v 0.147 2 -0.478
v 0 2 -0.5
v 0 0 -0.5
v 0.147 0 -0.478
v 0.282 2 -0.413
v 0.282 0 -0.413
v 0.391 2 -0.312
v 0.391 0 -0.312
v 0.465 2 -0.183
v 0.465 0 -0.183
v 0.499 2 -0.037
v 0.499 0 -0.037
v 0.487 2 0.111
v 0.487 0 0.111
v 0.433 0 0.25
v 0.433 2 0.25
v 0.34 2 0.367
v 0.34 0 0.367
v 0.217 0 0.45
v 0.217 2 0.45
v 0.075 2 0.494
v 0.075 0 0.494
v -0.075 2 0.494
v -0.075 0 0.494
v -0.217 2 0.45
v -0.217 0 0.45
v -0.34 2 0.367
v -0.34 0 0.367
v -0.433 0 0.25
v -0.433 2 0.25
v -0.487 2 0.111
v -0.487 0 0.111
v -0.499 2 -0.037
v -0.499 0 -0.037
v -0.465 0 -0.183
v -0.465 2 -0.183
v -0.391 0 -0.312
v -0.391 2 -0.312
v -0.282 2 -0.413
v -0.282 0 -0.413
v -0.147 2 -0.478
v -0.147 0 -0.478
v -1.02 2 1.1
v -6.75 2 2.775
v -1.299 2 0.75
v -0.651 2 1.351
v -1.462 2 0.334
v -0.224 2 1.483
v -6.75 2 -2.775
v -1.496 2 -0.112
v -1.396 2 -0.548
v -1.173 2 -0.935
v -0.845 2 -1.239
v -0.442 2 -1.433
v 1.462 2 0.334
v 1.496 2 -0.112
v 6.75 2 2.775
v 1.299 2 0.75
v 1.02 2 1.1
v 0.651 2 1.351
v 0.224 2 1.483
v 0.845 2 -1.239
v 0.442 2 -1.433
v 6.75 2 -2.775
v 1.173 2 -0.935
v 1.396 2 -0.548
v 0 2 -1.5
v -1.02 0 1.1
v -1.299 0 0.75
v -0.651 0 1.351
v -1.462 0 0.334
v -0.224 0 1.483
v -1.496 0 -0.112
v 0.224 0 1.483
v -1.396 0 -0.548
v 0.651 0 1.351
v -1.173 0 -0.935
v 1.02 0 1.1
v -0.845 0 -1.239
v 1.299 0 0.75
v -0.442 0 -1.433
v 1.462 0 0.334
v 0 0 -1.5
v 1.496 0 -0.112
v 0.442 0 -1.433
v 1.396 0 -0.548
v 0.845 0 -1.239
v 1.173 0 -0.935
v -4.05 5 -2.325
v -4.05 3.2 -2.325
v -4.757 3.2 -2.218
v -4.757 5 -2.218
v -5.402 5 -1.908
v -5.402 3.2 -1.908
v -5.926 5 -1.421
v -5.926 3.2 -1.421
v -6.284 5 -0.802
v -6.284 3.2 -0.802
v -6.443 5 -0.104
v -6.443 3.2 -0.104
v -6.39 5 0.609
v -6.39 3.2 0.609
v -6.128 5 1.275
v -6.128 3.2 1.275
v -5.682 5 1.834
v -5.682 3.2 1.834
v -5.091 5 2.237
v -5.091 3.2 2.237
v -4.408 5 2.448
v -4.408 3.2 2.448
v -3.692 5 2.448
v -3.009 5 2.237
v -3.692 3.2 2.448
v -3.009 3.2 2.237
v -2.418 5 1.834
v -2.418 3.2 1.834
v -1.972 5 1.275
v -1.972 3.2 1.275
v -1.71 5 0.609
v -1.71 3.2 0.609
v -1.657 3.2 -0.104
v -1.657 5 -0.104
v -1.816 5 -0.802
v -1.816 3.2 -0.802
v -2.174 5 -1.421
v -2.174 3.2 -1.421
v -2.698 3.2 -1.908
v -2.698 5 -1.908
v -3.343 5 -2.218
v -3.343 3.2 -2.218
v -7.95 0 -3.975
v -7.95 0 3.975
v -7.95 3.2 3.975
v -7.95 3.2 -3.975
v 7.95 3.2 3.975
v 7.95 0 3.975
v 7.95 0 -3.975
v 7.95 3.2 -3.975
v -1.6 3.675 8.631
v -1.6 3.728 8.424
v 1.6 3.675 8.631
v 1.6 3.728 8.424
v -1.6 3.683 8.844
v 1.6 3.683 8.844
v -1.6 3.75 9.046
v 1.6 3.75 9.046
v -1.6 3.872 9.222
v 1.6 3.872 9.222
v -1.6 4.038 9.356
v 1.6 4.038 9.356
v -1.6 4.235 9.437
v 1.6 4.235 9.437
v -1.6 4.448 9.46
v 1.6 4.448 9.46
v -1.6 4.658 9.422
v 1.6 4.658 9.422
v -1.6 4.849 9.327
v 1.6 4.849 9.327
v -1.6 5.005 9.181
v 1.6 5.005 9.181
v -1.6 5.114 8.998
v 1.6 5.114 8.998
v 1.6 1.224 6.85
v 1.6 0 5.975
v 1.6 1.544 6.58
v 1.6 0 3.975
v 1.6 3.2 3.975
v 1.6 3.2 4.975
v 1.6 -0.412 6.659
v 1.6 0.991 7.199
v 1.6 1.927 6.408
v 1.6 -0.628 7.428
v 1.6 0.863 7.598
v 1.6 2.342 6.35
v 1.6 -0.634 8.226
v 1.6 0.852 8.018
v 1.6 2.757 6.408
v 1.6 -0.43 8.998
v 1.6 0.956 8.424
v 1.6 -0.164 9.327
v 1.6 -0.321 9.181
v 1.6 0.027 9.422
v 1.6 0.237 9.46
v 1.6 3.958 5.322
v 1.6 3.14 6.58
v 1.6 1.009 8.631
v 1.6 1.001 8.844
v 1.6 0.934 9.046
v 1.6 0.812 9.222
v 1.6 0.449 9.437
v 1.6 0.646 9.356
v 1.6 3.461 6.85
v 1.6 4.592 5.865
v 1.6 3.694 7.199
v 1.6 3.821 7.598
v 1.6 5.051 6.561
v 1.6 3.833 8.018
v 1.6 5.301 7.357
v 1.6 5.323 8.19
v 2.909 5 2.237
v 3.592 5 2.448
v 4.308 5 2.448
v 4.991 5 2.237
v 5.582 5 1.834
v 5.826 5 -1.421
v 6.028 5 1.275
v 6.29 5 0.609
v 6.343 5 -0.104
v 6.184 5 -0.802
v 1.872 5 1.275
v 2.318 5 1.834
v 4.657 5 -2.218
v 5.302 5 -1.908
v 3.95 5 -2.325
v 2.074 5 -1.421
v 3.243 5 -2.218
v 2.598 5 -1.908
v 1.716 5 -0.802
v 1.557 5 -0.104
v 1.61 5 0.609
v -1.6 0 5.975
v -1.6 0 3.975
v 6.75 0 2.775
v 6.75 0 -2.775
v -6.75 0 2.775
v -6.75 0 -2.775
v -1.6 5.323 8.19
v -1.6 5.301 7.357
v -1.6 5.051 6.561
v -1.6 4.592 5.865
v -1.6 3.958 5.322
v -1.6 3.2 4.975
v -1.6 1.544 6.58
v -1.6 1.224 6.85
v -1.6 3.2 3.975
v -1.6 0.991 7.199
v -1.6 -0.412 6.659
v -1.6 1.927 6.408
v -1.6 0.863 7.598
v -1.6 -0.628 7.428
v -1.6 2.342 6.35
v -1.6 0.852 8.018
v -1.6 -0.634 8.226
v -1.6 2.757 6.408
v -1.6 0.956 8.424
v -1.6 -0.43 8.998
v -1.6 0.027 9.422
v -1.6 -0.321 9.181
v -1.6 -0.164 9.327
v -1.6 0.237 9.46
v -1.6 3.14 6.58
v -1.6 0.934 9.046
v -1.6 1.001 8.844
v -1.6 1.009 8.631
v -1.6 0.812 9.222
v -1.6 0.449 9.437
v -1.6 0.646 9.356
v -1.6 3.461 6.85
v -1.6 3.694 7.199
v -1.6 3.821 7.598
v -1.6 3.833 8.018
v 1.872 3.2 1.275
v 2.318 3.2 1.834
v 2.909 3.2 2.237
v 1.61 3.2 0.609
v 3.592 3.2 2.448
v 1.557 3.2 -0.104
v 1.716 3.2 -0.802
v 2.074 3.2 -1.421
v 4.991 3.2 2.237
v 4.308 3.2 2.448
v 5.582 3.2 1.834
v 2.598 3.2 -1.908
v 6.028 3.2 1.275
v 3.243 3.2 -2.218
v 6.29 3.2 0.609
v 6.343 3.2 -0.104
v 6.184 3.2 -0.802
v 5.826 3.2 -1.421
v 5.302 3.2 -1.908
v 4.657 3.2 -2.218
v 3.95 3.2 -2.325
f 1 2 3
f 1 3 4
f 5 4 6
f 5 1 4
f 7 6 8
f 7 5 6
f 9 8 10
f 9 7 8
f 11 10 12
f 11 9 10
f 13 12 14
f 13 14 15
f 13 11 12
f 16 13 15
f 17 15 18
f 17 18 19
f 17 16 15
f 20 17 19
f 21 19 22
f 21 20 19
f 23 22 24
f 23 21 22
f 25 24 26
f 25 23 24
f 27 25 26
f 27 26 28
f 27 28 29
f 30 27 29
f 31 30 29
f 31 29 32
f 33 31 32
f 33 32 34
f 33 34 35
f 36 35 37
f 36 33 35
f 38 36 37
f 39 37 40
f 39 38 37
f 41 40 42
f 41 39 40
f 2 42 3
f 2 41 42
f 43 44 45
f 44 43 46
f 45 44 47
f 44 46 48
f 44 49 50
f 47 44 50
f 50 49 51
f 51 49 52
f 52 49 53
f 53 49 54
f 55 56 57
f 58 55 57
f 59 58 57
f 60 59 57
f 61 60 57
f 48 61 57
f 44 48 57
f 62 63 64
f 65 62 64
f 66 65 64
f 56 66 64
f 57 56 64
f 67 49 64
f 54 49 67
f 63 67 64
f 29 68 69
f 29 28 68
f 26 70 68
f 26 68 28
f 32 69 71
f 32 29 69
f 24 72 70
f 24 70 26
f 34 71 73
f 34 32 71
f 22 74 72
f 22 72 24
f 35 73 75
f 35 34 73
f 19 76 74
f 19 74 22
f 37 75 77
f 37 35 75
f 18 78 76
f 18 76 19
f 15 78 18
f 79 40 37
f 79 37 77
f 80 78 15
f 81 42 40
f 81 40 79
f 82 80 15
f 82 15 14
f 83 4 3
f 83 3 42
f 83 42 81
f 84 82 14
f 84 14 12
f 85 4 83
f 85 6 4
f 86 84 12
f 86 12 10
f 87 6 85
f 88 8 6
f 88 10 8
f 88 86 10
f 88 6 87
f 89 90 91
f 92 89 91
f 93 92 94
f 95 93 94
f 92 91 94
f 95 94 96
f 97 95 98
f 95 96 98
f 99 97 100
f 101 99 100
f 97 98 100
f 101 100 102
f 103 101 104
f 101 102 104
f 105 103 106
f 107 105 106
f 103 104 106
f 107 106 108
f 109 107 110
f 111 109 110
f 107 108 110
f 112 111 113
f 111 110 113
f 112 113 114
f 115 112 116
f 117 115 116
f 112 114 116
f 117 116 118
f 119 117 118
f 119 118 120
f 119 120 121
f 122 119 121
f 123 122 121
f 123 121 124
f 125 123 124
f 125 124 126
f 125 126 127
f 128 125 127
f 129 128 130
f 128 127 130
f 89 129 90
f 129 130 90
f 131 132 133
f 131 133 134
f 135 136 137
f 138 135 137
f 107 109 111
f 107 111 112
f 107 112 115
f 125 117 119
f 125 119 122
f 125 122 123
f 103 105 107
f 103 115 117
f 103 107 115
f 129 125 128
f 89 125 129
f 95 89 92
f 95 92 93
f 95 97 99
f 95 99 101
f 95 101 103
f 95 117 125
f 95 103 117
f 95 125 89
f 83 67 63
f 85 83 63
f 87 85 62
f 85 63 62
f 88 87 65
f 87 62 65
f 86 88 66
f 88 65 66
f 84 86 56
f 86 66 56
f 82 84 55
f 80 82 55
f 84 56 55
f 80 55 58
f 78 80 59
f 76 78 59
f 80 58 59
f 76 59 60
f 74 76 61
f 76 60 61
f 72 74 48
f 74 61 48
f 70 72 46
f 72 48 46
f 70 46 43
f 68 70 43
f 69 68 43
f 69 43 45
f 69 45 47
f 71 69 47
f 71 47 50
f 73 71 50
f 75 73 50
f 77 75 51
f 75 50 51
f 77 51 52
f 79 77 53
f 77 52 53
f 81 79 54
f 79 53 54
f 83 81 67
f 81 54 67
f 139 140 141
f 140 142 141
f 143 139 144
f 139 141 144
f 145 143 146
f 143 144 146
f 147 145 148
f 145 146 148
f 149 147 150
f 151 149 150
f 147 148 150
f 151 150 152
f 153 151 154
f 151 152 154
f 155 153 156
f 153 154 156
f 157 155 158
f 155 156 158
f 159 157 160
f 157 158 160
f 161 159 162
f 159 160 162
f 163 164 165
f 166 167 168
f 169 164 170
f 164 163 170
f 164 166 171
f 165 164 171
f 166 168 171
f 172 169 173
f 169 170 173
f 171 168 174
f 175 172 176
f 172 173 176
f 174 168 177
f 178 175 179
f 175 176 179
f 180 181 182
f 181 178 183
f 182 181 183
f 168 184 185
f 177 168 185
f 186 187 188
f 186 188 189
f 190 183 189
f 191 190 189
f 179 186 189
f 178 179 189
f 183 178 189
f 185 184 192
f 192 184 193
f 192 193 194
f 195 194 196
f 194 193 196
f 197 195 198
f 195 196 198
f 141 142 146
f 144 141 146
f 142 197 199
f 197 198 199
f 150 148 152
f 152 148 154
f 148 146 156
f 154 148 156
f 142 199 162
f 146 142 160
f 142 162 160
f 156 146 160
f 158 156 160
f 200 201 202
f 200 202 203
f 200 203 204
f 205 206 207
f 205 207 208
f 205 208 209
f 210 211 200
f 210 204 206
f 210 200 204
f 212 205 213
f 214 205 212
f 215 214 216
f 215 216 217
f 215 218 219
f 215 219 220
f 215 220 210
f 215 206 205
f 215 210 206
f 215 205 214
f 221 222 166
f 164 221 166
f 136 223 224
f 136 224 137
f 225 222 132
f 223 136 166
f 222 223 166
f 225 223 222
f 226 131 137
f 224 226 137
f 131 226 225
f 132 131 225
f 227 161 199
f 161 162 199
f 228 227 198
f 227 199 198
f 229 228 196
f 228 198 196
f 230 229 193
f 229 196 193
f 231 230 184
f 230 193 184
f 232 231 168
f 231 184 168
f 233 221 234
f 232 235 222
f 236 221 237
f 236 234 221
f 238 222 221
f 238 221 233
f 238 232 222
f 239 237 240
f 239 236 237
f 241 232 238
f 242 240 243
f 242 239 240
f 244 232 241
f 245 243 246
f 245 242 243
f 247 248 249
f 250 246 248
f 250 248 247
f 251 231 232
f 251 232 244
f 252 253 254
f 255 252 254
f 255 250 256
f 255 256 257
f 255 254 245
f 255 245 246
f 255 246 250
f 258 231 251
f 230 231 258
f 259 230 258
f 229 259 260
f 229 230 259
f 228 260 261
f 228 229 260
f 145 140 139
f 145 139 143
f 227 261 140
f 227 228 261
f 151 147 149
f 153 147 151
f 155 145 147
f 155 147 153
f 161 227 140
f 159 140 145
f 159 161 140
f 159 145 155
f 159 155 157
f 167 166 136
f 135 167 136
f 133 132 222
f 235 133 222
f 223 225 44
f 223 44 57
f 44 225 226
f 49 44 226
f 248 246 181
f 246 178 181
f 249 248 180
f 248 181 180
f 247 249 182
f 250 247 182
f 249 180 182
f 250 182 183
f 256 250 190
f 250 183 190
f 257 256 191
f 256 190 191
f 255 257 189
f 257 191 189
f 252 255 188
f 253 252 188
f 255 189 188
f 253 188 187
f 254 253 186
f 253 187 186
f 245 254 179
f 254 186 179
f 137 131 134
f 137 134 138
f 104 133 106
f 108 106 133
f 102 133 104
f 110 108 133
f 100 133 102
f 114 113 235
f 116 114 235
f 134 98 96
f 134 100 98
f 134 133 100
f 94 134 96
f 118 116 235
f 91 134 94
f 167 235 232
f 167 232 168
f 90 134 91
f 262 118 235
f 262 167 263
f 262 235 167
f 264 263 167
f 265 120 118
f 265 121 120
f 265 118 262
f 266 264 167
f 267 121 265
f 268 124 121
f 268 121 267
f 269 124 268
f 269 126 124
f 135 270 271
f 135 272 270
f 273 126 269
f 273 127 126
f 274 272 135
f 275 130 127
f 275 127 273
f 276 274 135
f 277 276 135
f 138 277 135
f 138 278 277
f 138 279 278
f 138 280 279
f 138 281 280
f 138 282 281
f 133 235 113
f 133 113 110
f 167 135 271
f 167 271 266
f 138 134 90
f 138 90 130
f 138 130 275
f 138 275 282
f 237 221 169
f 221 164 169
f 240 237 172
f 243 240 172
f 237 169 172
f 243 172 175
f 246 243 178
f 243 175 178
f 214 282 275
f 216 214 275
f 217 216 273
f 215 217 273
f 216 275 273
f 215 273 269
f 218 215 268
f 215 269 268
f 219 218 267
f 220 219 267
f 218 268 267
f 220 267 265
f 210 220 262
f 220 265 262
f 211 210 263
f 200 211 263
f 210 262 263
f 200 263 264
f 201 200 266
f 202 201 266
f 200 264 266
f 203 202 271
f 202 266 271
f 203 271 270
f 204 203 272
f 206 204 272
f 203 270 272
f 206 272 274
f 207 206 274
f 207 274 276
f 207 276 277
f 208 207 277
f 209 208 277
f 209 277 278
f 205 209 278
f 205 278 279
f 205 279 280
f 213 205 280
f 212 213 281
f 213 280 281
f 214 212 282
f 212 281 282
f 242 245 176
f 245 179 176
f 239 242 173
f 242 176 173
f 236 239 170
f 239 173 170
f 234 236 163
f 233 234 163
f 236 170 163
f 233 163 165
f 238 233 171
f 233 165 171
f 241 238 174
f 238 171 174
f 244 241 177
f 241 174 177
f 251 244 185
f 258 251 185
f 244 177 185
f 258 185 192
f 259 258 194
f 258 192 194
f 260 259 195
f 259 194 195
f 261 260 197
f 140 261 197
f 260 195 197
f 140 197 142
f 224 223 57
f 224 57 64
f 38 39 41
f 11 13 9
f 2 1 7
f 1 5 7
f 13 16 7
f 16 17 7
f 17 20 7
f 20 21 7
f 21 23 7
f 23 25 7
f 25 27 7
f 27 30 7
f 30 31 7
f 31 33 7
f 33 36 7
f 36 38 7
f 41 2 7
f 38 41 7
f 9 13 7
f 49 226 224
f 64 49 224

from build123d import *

# Parameters (mm, degrees)
SKETCH1_W           = 15.9
SKETCH1_H           = 7.95
BOSS_EXTRUDE1_DEPTH = 3.2
SHELL1_T            = -1.2
SKETCH3_R           = 1.5
SKETCH3_R_2         = 0.5
BOSS_EXTRUDE3_DEPTH = 2
SKETCH4_R           = 2.4
BOSS_EXTRUDE4_DEPTH = 1.8
LPATTERN1_COUNT     = 2
LPATTERN1_PITCH     = 8
BOSS_EXTRUDE5_DEPTH = 1.6


with BuildPart() as part:
    # Sketch1 → Boss-Extrude1 (new body)
    with BuildSketch(Plane(origin=(0, 0, 0), x_dir=(1, 0, 0), z_dir=(0, 1, 0))):
        Rectangle(SKETCH1_W, SKETCH1_H)
    extrude(amount=BOSS_EXTRUDE1_DEPTH)

    # Shell1
    shell1_openings = [part.faces().sort_by_distance(p)[0] for p in [
        (0, 0, 0),
    ]]
    offset(amount=SHELL1_T, openings=shell1_openings, kind=Kind.INTERSECTION)

    # Sketch3 → Boss-Extrude3 (add)
    with BuildSketch(Plane.XZ.offset(-2)):
        with Locations(Location((0, 0, 0), (0, 0, 270))):
            Circle(SKETCH3_R)
        with Locations(Location((0, 0, 0), (0, 0, 270))):
            Circle(SKETCH3_R_2, mode=Mode.SUBTRACT)
    extrude(amount=BOSS_EXTRUDE3_DEPTH)

    # Sketch4 → Boss-Extrude4 (add)
    with BuildSketch(Plane(origin=(0, 3.2, 0), x_dir=(1, 0, 0), z_dir=(0, 1, 0))):
        with Locations(Location((-4.05, -0.075, 0), (0, 0, 90))):
            Circle(SKETCH4_R)
    boss_extrude4 = extrude(amount=BOSS_EXTRUDE4_DEPTH)

    # LPattern1: Boss-Extrude4 ×2
    with Locations(*[(i * LPATTERN1_PITCH, 0, 0) for i in range(1, LPATTERN1_COUNT)]):
        add(boss_extrude4)

    # Sketch5 → Boss-Extrude5 (add, symmetric)
    with BuildSketch(Plane(origin=(0, 0, 0), x_dir=(0, 0, -1), z_dir=(1, 0, 0))):
        with BuildLine():
            Line((-3.975, 0), (-5.975, 0))
            ThreePointArc((-5.975, 0), (-7.427655013, -0.628062458), (-8.997768861, -0.429539046))
            ThreePointArc((-8.997768861, -0.429539046), (-9.403665936, 0.550383177), (-8.423743712, 0.956280252))
            ThreePointArc((-8.423743712, 0.956280252), (-6.349718564, 2.342099551), (-8.423743712, 3.72791885))
            ThreePointArc((-8.423743712, 3.72791885), (-9.403665936, 4.133815925), (-8.997768861, 5.113738149))
            ThreePointArc((-8.997768861, 5.113738149), (-6.560942303, 5.051168718), (-4.975, 3.2))
            Line((-4.975, 3.2), (-3.975, 3.2))
            Line((-3.975, 3.2), (-3.975, 0))
        make_face()
    extrude(amount=BOSS_EXTRUDE5_DEPTH, both=True)


solid = part.part
